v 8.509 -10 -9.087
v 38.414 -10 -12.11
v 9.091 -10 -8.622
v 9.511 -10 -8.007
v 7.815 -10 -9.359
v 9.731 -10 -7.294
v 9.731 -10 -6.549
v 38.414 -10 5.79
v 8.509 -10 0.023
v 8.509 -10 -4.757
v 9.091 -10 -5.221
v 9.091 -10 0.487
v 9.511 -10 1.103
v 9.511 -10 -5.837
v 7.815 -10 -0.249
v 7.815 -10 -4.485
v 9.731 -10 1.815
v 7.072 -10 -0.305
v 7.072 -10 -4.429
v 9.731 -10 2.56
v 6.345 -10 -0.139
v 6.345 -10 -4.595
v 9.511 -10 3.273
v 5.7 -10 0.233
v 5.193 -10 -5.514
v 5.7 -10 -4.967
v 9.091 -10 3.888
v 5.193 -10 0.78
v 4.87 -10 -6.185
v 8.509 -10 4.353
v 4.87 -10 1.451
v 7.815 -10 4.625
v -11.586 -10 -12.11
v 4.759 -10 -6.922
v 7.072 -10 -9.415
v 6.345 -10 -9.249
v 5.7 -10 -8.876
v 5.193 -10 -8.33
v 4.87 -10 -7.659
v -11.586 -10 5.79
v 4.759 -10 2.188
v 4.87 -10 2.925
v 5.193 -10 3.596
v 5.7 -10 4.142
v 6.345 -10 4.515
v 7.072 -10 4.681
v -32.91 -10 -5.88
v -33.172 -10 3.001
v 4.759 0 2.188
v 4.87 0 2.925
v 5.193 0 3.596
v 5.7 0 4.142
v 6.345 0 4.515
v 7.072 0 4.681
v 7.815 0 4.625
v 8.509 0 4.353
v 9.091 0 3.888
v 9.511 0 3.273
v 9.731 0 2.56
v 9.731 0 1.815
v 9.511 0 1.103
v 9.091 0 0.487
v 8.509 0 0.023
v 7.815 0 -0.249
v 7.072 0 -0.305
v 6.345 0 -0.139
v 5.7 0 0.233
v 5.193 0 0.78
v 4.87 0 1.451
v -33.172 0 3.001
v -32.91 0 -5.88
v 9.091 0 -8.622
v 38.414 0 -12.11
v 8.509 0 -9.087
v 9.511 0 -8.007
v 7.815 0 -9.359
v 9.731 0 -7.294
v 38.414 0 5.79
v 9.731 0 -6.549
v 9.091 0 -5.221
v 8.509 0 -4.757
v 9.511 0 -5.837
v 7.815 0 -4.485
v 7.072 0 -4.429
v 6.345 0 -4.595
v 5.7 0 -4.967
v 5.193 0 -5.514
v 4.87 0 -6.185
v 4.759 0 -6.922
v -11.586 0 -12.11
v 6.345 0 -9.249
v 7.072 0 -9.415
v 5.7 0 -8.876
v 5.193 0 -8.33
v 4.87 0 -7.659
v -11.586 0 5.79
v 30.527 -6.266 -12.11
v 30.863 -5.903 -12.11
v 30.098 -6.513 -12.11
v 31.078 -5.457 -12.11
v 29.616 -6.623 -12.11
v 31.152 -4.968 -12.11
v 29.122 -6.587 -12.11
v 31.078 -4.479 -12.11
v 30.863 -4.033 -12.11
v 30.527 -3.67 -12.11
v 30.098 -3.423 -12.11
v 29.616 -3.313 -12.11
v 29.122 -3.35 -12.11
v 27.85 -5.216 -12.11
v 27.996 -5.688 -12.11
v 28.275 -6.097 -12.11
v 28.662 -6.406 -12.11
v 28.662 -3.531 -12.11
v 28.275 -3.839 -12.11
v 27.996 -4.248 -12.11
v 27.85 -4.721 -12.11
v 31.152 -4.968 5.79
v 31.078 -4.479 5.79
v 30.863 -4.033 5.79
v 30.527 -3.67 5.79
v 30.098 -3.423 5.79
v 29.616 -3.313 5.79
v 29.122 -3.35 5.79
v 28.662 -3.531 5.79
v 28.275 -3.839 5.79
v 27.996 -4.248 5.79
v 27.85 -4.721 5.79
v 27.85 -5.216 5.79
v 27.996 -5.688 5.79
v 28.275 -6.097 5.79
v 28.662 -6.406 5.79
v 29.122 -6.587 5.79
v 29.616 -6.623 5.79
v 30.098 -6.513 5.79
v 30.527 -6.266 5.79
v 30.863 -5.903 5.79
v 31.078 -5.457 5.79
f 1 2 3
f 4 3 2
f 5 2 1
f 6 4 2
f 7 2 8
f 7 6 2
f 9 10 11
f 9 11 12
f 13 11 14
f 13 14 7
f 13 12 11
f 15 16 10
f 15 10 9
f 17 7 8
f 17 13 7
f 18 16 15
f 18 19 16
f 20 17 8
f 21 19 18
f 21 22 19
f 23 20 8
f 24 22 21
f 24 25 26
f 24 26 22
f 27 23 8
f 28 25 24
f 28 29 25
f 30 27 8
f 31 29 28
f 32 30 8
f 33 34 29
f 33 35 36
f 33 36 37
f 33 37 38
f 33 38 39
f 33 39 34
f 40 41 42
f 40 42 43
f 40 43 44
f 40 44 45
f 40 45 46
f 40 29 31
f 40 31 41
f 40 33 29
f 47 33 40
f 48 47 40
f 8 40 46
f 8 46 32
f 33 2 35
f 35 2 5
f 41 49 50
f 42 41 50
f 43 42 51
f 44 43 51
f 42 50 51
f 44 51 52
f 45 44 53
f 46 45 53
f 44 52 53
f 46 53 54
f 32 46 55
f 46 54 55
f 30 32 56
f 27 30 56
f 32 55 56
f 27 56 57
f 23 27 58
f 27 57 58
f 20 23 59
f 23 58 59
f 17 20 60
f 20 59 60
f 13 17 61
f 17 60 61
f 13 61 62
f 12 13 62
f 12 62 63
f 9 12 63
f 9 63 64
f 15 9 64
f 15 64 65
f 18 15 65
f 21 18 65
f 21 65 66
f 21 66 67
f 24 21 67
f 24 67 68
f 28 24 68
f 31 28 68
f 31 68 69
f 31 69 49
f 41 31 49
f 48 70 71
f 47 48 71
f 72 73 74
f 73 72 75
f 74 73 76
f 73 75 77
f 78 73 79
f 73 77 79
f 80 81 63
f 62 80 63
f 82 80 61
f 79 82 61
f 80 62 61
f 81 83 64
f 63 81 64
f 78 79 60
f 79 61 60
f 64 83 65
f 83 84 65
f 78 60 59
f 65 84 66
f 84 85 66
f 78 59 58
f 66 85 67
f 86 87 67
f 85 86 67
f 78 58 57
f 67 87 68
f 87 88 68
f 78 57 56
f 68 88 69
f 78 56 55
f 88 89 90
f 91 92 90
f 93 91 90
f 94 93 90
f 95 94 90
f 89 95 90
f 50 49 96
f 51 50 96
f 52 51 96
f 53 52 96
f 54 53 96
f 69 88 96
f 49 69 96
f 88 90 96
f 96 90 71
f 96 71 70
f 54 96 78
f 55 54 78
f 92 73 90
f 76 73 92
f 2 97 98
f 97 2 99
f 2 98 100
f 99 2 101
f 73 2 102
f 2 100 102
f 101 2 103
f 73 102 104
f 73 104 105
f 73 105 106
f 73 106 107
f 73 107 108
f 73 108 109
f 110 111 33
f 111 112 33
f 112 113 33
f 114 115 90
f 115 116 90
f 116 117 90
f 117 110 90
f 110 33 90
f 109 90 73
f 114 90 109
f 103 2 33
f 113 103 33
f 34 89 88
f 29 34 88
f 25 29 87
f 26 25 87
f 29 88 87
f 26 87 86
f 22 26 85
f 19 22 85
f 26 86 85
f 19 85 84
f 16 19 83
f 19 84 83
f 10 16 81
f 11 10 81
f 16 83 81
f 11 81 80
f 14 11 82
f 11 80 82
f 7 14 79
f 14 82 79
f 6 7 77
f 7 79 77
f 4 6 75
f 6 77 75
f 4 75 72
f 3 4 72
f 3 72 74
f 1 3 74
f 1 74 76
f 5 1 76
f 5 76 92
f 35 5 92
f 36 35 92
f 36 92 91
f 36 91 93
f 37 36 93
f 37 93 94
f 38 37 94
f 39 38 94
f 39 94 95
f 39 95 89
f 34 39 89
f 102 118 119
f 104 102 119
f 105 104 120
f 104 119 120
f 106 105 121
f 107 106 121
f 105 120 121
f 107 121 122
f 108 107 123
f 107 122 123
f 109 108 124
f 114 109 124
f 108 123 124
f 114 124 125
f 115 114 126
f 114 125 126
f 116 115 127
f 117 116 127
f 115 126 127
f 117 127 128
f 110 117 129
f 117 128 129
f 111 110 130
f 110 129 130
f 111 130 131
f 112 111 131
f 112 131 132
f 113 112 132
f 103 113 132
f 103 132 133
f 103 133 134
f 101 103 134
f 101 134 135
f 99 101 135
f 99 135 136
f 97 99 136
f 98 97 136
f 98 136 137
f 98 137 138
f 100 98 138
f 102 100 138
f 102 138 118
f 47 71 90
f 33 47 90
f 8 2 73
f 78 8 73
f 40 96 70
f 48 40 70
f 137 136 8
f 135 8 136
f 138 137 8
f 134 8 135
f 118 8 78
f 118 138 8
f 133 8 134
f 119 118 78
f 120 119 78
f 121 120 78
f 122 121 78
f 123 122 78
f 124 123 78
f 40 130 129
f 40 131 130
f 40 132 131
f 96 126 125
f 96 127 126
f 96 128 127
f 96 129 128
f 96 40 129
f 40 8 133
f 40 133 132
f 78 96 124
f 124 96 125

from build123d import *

# Parameters (mm, degrees)
F0_W     = 25
F0_H     = 17.9
F1_DEPTH = 10
F3_D     = 5
F4_W     = 10
F4_H     = 17.9
F5_DEPTH = 25
F6_R     = 1.66
F7_DEPTH = 25


# Not quite as in the source:
# - a feature names something its author has since deleted; it is built from what else it names


with BuildPart() as f1:
    # F0 (on Front) → F1 (new body)
    with BuildSketch(Plane.XZ):
        Polygon((-11.5858212113, -12.1098860052), (-11.5858212113, 5.7901139948), (-33.1716425717, 3.0010114424), (-32.9104475677, -5.8795856312), align=None)
        with Locations((0.9141787887, -3.1598860052)):
            Rectangle(F0_W, F0_H)
    extrude(amount=F1_DEPTH)

    # F3 (through all)
    with Locations(Plane.XZ.offset(10)):
        with Locations((7.2585181333, 2.1878613625), (7.2585181333, -6.9218412973)):
            Hole(F3_D / 2)

    # F4 (on face) → F5 (join)
    with BuildSketch(Plane.YZ.offset(13.4141787887)):
        with Locations((-5, -3.1598860052)):
            Rectangle(F4_W, F4_H)
    extrude(amount=F5_DEPTH)

    # F6 (on face) → F7 (cut)
    with BuildSketch(Plane.XY.offset(5.7901139948)):
        with Locations((29.4916108251, -4.9681207165)):
            Circle(F6_R)
    extrude(amount=-F7_DEPTH, mode=Mode.SUBTRACT)


solid = f1.part
